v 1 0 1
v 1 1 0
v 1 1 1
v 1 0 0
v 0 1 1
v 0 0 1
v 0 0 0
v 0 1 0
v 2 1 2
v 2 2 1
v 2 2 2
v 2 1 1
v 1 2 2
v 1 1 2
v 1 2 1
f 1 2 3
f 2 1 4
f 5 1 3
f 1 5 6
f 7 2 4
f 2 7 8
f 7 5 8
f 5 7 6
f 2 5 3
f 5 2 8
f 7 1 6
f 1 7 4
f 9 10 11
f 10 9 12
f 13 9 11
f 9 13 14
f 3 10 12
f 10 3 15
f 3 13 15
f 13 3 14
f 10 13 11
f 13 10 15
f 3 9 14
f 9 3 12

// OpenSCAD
union() { cube([1,1,1]); translate([1,1,1]) cube([1,1,1]); }
